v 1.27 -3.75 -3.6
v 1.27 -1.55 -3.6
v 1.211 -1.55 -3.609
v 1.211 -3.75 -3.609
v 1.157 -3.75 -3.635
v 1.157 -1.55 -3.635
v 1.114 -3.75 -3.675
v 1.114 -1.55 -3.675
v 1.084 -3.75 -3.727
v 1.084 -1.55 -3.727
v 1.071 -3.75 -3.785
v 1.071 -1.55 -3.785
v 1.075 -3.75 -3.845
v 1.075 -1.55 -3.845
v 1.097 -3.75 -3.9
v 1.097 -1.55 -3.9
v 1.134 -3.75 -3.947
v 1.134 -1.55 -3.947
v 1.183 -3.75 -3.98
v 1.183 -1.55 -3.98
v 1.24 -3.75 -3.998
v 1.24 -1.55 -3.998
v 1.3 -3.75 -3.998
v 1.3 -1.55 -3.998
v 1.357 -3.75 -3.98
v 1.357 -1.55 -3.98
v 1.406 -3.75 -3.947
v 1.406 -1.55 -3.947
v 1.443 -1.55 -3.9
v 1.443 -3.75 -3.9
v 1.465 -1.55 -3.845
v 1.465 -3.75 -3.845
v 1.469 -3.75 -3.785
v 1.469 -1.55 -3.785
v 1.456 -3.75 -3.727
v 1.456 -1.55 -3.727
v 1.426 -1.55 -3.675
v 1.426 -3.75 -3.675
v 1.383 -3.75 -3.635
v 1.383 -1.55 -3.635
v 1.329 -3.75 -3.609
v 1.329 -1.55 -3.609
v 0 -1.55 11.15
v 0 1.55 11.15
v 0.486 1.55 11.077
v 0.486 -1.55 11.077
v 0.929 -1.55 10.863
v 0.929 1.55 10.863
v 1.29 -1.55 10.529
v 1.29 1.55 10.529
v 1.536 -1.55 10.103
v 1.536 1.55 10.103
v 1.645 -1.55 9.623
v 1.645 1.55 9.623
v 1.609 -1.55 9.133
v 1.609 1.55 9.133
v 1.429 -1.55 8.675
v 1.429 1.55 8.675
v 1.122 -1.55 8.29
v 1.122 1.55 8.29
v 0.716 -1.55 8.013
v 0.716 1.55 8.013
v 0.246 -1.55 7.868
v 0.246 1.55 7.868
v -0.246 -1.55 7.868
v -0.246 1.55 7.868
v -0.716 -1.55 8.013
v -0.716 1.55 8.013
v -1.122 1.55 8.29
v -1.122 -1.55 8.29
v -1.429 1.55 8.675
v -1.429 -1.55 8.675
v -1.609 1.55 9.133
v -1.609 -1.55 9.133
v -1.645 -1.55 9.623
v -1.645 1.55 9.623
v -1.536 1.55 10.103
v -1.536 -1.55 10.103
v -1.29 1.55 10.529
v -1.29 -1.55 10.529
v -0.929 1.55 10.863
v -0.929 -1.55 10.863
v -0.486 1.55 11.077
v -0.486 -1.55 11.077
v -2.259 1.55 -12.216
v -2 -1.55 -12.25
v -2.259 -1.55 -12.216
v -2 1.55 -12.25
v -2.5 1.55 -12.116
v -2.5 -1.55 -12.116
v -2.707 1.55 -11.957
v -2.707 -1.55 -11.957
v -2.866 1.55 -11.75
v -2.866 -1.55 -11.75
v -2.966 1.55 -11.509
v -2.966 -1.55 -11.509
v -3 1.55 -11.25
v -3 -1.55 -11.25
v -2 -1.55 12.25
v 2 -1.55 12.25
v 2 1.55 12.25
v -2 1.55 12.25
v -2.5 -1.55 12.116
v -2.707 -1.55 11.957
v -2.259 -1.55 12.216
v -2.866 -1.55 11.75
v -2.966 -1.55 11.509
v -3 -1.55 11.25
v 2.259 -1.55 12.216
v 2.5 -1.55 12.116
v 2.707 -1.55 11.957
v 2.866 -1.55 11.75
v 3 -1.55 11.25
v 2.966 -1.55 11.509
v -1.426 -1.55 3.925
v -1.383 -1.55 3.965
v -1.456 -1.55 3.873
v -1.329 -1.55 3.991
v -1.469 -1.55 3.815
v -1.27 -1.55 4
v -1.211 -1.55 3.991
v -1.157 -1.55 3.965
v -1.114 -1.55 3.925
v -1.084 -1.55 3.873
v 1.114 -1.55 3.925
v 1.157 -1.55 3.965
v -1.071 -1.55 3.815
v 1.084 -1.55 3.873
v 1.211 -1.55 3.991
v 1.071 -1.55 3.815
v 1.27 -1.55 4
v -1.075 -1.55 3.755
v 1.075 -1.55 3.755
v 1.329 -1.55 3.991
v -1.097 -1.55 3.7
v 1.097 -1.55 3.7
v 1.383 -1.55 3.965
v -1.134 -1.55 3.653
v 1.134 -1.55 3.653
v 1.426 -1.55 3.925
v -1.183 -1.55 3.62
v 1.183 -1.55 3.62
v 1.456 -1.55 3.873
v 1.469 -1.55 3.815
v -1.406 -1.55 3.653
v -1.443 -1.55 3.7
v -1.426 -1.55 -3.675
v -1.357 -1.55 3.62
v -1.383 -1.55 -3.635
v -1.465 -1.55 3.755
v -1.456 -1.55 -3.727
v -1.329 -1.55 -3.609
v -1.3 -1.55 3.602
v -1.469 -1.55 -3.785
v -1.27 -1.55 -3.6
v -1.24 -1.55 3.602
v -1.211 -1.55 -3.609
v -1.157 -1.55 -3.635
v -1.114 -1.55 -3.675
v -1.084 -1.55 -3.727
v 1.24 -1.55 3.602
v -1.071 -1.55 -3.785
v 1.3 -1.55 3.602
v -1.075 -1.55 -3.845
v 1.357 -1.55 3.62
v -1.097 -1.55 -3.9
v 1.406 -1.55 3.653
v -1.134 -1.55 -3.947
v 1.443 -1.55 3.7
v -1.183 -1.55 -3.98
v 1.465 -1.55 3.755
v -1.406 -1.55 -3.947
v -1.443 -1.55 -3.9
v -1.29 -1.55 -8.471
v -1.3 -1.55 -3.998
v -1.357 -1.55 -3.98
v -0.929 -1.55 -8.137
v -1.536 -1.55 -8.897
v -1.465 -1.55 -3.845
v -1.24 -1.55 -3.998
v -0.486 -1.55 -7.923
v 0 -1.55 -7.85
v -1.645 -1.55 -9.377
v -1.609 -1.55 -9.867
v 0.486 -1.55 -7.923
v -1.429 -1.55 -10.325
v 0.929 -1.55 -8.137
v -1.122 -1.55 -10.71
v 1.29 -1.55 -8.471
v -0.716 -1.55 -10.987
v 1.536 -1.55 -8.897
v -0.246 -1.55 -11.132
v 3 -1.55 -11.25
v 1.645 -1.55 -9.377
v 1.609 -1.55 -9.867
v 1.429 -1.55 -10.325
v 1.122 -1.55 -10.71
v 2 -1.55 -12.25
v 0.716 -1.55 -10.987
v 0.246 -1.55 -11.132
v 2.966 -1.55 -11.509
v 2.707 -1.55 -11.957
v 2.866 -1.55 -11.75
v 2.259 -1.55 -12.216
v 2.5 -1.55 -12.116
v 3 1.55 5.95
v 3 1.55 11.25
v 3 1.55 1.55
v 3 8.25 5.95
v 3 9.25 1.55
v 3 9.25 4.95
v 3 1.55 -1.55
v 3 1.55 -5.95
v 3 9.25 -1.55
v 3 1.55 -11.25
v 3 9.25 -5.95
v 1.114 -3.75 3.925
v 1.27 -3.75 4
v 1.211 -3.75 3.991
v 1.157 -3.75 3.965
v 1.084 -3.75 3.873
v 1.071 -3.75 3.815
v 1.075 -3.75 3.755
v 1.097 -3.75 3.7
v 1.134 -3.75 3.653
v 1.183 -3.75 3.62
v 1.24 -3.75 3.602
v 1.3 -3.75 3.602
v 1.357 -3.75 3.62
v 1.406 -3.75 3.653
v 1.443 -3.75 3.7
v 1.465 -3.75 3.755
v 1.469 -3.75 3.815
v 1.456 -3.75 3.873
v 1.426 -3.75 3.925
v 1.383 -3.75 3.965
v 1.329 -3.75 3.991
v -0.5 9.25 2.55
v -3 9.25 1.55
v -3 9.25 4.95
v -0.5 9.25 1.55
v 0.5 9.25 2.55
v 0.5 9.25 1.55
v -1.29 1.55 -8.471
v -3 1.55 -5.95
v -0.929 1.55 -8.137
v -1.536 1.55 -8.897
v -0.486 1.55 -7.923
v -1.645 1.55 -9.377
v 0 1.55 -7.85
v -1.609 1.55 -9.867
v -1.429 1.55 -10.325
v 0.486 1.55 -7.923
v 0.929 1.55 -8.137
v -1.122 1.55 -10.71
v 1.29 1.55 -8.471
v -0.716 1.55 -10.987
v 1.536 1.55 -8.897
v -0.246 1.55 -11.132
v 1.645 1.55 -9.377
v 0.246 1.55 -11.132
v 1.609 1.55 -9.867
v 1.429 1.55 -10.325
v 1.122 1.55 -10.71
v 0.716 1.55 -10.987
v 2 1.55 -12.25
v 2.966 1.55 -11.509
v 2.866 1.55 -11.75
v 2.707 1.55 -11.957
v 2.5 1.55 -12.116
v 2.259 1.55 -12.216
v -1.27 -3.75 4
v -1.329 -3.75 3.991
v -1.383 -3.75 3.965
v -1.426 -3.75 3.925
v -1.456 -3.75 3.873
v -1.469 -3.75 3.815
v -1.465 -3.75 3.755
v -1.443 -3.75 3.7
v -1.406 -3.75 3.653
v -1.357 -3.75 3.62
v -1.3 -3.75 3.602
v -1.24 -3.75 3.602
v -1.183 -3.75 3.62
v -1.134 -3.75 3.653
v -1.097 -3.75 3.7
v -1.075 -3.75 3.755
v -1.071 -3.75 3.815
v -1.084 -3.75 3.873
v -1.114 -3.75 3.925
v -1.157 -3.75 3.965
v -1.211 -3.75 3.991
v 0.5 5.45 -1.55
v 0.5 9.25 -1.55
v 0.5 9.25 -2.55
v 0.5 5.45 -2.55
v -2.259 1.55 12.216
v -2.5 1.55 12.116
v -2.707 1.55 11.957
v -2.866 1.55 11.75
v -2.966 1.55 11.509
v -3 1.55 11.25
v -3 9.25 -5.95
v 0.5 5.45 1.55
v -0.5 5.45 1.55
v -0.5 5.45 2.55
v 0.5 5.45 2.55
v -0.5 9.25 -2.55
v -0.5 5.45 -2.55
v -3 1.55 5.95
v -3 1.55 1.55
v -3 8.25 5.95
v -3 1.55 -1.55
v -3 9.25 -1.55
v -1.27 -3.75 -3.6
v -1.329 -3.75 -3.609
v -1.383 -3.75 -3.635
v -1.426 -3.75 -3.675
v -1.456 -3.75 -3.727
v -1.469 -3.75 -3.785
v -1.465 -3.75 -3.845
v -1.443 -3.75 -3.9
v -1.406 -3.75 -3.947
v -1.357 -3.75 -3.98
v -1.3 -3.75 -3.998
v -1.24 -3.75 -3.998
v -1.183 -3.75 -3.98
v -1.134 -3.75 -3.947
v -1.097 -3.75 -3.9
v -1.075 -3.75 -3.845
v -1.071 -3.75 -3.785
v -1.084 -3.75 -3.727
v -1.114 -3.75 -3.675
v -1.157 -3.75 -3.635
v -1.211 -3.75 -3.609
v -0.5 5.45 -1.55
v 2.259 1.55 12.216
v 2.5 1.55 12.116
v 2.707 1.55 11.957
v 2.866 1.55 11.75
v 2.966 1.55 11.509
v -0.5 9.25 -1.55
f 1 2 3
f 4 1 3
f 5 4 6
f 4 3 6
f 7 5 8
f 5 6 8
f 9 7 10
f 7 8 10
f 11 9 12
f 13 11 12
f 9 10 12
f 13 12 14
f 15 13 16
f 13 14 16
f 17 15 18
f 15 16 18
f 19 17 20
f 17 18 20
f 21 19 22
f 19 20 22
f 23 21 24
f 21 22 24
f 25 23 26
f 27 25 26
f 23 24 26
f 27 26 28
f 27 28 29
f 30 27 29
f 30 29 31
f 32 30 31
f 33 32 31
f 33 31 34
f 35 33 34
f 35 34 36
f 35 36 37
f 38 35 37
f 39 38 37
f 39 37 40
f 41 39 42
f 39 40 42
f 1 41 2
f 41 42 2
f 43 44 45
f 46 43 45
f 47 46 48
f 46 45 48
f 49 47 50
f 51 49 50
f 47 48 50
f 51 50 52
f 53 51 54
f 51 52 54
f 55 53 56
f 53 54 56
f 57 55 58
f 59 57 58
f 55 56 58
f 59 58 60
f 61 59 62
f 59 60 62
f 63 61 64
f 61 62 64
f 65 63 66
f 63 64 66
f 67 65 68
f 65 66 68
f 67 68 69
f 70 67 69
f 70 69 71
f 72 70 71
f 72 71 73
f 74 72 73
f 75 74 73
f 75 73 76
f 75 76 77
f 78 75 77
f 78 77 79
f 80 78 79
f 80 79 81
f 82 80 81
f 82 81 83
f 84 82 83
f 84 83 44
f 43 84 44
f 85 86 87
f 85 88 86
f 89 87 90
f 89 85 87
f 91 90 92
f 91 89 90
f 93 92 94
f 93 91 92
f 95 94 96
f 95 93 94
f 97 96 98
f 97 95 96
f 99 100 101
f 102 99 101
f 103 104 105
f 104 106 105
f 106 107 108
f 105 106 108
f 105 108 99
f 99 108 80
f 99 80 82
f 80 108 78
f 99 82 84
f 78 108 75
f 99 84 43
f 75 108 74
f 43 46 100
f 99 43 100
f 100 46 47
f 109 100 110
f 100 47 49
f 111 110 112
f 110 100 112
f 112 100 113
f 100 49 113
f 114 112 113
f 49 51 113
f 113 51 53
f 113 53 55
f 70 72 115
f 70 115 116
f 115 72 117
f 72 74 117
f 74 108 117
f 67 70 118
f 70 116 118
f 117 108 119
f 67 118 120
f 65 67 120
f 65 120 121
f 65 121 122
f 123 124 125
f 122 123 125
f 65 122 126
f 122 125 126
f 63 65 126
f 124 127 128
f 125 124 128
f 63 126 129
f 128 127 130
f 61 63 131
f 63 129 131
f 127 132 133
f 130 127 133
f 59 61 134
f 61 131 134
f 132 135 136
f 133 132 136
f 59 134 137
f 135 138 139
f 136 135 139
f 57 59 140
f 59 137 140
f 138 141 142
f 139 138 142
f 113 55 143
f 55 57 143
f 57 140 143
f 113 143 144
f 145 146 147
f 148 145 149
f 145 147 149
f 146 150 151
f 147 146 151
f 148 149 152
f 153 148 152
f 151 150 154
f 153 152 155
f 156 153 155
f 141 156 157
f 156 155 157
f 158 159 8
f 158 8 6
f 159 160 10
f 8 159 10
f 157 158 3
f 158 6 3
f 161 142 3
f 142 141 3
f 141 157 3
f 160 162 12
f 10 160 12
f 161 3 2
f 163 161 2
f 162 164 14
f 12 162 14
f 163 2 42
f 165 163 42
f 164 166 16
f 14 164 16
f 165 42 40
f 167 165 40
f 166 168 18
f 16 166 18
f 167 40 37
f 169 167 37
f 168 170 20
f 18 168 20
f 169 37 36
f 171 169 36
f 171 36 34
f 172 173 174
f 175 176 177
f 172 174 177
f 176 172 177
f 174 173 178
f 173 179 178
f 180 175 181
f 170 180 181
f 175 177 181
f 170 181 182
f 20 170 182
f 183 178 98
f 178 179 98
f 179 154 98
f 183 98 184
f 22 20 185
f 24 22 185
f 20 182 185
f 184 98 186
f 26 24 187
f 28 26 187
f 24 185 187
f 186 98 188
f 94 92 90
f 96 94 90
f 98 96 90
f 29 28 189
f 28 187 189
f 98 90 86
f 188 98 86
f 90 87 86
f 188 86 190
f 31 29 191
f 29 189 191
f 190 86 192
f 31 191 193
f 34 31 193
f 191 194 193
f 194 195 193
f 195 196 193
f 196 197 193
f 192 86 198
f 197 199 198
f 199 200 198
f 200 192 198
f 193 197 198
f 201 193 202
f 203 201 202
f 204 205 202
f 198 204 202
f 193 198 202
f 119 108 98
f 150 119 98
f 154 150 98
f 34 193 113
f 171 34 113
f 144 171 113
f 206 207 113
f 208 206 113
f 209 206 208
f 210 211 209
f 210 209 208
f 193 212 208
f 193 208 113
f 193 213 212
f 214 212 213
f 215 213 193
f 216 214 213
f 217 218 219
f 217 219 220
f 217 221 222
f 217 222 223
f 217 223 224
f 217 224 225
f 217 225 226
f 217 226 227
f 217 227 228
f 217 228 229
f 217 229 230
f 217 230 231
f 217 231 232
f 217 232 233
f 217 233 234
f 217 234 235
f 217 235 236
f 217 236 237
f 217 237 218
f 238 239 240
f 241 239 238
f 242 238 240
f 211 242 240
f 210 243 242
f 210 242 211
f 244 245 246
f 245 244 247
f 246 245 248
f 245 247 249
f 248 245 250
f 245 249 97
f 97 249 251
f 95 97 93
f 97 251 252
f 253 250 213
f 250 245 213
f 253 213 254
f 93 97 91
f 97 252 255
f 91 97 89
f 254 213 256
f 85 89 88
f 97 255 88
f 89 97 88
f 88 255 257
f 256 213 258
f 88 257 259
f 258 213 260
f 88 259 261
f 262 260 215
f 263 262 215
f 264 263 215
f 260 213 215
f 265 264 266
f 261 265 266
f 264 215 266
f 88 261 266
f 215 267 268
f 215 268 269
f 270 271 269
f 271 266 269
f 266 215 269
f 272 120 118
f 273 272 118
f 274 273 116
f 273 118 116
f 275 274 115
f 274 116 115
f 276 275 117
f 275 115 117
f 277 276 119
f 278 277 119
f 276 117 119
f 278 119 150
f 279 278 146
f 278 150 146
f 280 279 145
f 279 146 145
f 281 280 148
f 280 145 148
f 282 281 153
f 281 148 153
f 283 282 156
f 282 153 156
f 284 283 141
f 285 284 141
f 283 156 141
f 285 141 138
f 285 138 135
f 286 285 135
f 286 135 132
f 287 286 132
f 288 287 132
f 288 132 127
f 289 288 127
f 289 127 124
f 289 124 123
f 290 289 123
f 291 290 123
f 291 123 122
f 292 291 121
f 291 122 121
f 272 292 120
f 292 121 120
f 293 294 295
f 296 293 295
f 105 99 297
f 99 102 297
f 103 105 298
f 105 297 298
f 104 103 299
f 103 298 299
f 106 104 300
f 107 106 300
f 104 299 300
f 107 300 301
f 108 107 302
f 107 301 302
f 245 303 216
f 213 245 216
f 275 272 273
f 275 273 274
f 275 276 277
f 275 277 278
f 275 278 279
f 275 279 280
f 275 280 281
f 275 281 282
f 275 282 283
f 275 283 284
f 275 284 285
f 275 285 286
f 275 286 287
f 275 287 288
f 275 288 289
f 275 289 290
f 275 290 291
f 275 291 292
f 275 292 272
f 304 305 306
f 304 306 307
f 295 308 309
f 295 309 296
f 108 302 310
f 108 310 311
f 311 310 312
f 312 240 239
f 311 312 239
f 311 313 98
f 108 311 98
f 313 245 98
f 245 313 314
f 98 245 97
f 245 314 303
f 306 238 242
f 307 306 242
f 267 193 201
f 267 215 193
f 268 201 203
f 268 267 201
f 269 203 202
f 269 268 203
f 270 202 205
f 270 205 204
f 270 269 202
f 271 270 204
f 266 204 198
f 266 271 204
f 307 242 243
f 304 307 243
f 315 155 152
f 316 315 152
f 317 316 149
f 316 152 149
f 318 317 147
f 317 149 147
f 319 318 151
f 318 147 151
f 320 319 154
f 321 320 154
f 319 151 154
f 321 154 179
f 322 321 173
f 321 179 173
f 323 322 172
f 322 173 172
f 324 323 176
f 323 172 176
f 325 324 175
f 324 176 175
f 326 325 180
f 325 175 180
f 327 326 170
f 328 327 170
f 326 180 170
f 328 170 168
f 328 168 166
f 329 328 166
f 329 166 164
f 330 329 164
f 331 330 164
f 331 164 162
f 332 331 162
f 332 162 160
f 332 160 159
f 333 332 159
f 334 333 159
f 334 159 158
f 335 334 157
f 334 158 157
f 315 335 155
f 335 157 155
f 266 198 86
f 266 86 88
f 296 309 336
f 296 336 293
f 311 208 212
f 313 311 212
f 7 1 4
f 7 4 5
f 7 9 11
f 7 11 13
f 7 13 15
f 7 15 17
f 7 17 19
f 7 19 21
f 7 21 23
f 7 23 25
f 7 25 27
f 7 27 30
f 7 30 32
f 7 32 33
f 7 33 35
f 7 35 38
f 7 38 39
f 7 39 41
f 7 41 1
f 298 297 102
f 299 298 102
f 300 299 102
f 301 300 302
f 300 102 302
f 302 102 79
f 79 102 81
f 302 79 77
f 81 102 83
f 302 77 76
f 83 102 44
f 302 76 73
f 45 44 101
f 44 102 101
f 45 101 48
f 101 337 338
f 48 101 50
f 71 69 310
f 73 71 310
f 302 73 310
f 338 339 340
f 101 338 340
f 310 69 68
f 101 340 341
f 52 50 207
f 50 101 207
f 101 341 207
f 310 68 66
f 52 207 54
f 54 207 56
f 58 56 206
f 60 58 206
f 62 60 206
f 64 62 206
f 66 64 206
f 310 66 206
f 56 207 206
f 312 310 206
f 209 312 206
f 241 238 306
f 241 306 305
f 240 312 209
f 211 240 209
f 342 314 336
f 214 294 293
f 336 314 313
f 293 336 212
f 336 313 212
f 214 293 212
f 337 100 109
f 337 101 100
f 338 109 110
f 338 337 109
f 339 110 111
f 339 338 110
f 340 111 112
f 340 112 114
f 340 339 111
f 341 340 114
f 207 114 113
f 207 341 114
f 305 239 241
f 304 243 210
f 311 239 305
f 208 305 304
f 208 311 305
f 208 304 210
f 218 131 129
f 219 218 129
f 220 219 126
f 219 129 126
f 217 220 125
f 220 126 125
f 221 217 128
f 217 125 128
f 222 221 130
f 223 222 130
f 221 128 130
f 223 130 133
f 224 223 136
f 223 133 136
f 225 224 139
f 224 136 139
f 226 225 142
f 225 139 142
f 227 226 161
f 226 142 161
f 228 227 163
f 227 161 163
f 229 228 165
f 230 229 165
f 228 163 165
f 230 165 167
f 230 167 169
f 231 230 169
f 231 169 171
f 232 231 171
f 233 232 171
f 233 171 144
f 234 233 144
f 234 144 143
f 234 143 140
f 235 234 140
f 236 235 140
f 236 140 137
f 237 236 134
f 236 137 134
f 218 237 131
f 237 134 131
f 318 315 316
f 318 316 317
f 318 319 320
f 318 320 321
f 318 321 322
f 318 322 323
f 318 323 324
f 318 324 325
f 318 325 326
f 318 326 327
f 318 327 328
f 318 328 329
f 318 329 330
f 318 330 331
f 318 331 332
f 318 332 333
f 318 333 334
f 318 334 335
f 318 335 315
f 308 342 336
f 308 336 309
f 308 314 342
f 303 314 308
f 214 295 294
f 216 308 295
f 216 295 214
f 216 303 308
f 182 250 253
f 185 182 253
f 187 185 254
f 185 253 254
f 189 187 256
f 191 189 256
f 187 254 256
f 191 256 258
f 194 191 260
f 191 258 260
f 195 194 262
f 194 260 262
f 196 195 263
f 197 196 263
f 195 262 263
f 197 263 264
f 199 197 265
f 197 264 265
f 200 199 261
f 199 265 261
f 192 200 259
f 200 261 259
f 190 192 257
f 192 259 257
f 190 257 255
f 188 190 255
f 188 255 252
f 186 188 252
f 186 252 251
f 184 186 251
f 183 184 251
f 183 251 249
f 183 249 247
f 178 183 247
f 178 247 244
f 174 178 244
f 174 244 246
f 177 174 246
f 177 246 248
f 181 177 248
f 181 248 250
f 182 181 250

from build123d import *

# Parameters (mm, degrees)
SKETCH_1_W          = 24.5
SKETCH_1_H          = 3.1
EXTRUDE_1_DEPTH     = 3
FILLET_1_R          = 1
EXTRUDE_START       = -3.1
SKETCH_2_W          = 6
SKETCH_2_H          = 4.4
EXTRUDE_2_DEPTH     = 10.8
CUT_EXTRUDE_1_REACH = 16.777
SKETCH_2_3_R        = 1.65
CHAMFER_1_SIZE      = 1
SKETCH_3_W          = 1
SKETCH_3_H          = 1
CUT_EXTRUDE_2_DEPTH = 3.8
SKETCH_4_R          = 0.2
EXTRUDE_3_DEPTH     = 2.2


with BuildPart() as part:
    # Эскиз1 → Бобышка-Вытянуть1 (new, symmetric)
    with BuildSketch(Plane(origin=(0, 0, 0), x_dir=(0, 0, -1), z_dir=(1, 0, 0))):
        Rectangle(SKETCH_1_W, SKETCH_1_H)
    extrude(amount=EXTRUDE_1_DEPTH, both=True)

    # Скругление1
    fillet_1_edges = [part.edges().sort_by_distance(p)[0] for p in [
        (3, 0, 12.25),
        (-3, 0, 12.25),
        (-3, 0, -12.25),
        (3, 0, -12.25),
    ]]
    fillet(fillet_1_edges, radius=FILLET_1_R)

    # Эскиз2 → Бобышка-Вытянуть2 (add)
    with BuildSketch(Plane(origin=(0, 1.55, 0), x_dir=(1, 0, 0), z_dir=(0, 1, 0)).offset(EXTRUDE_START)):
        with Locations((0, 3.75)):
            Rectangle(SKETCH_2_W, SKETCH_2_H)
        with Locations((0, -3.75)):
            Rectangle(SKETCH_2_W, SKETCH_2_H)
    extrude(amount=EXTRUDE_2_DEPTH)

    # Эскиз2<3> → Вырез-Вытянуть1 (cut, up to next)
    with BuildSketch(Plane(origin=(0, 1.55, 0), x_dir=(1, 0, 0), z_dir=(0, 1, 0)), mode=Mode.PRIVATE) as cut_extrude_1_sk1:
        with Locations(Location((0, -9.5, 0), (0, 0, 270))):
            Circle(SKETCH_2_3_R)
    cut_extrude_1_tool1 = extrude(cut_extrude_1_sk1.sketch, amount=-CUT_EXTRUDE_1_REACH, mode=Mode.PRIVATE) & part.part
    # Эскиз2<3> → Вырез-Вытянуть1 (cut, up to next)
    with BuildSketch(Plane(origin=(0, 1.55, 0), x_dir=(1, 0, 0), z_dir=(0, 1, 0)), mode=Mode.PRIVATE) as cut_extrude_1_sk2:
        with Locations(Location((0, 9.5, 0), (0, 0, 270))):
            Circle(SKETCH_2_3_R)
    cut_extrude_1_tool2 = extrude(cut_extrude_1_sk2.sketch, amount=-CUT_EXTRUDE_1_REACH, mode=Mode.PRIVATE) & part.part
    add(cut_extrude_1_tool1.solids().sort_by_distance((0, 1.55, 9.5))[0], mode=Mode.SUBTRACT)
    add(cut_extrude_1_tool2.solids().sort_by_distance((0, 1.55, -9.5))[0], mode=Mode.SUBTRACT)

    # Фаска1
    chamfer_1_edges = [part.edges().sort_by_distance(p)[0] for p in [
        (0, 9.25, 5.95),
    ]]
    chamfer(chamfer_1_edges, length=CHAMFER_1_SIZE)

    # Эскиз3 → Вырез-Вытянуть2 (cut)
    with BuildSketch(Plane(origin=(0, 9.25, 0), x_dir=(1, 0, 0), z_dir=(0, 1, 0))):
        with Locations((0, 2.05)):
            Rectangle(SKETCH_3_W, SKETCH_3_H)
        with Locations((0, -2.05)):
            Rectangle(SKETCH_3_W, SKETCH_3_H)
    extrude(amount=-CUT_EXTRUDE_2_DEPTH, mode=Mode.SUBTRACT)

    # Эскиз4 → Бобышка-Вытянуть3 (add)
    with BuildSketch(Plane.XZ.offset(1.55)):
        with Locations(Location((-1.27, 3.8, 0), (0, 0, 90))):
            Circle(SKETCH_4_R)
        with Locations(Location((1.27, 3.8, 0), (0, 0, 90))):
            Circle(SKETCH_4_R)
        with Locations(Location((1.27, -3.8, 0), (0, 0, 90))):
            Circle(SKETCH_4_R)
        with Locations(Location((-1.27, -3.8, 0), (0, 0, 90))):
            Circle(SKETCH_4_R)
    extrude(amount=EXTRUDE_3_DEPTH)


solid = part.part
